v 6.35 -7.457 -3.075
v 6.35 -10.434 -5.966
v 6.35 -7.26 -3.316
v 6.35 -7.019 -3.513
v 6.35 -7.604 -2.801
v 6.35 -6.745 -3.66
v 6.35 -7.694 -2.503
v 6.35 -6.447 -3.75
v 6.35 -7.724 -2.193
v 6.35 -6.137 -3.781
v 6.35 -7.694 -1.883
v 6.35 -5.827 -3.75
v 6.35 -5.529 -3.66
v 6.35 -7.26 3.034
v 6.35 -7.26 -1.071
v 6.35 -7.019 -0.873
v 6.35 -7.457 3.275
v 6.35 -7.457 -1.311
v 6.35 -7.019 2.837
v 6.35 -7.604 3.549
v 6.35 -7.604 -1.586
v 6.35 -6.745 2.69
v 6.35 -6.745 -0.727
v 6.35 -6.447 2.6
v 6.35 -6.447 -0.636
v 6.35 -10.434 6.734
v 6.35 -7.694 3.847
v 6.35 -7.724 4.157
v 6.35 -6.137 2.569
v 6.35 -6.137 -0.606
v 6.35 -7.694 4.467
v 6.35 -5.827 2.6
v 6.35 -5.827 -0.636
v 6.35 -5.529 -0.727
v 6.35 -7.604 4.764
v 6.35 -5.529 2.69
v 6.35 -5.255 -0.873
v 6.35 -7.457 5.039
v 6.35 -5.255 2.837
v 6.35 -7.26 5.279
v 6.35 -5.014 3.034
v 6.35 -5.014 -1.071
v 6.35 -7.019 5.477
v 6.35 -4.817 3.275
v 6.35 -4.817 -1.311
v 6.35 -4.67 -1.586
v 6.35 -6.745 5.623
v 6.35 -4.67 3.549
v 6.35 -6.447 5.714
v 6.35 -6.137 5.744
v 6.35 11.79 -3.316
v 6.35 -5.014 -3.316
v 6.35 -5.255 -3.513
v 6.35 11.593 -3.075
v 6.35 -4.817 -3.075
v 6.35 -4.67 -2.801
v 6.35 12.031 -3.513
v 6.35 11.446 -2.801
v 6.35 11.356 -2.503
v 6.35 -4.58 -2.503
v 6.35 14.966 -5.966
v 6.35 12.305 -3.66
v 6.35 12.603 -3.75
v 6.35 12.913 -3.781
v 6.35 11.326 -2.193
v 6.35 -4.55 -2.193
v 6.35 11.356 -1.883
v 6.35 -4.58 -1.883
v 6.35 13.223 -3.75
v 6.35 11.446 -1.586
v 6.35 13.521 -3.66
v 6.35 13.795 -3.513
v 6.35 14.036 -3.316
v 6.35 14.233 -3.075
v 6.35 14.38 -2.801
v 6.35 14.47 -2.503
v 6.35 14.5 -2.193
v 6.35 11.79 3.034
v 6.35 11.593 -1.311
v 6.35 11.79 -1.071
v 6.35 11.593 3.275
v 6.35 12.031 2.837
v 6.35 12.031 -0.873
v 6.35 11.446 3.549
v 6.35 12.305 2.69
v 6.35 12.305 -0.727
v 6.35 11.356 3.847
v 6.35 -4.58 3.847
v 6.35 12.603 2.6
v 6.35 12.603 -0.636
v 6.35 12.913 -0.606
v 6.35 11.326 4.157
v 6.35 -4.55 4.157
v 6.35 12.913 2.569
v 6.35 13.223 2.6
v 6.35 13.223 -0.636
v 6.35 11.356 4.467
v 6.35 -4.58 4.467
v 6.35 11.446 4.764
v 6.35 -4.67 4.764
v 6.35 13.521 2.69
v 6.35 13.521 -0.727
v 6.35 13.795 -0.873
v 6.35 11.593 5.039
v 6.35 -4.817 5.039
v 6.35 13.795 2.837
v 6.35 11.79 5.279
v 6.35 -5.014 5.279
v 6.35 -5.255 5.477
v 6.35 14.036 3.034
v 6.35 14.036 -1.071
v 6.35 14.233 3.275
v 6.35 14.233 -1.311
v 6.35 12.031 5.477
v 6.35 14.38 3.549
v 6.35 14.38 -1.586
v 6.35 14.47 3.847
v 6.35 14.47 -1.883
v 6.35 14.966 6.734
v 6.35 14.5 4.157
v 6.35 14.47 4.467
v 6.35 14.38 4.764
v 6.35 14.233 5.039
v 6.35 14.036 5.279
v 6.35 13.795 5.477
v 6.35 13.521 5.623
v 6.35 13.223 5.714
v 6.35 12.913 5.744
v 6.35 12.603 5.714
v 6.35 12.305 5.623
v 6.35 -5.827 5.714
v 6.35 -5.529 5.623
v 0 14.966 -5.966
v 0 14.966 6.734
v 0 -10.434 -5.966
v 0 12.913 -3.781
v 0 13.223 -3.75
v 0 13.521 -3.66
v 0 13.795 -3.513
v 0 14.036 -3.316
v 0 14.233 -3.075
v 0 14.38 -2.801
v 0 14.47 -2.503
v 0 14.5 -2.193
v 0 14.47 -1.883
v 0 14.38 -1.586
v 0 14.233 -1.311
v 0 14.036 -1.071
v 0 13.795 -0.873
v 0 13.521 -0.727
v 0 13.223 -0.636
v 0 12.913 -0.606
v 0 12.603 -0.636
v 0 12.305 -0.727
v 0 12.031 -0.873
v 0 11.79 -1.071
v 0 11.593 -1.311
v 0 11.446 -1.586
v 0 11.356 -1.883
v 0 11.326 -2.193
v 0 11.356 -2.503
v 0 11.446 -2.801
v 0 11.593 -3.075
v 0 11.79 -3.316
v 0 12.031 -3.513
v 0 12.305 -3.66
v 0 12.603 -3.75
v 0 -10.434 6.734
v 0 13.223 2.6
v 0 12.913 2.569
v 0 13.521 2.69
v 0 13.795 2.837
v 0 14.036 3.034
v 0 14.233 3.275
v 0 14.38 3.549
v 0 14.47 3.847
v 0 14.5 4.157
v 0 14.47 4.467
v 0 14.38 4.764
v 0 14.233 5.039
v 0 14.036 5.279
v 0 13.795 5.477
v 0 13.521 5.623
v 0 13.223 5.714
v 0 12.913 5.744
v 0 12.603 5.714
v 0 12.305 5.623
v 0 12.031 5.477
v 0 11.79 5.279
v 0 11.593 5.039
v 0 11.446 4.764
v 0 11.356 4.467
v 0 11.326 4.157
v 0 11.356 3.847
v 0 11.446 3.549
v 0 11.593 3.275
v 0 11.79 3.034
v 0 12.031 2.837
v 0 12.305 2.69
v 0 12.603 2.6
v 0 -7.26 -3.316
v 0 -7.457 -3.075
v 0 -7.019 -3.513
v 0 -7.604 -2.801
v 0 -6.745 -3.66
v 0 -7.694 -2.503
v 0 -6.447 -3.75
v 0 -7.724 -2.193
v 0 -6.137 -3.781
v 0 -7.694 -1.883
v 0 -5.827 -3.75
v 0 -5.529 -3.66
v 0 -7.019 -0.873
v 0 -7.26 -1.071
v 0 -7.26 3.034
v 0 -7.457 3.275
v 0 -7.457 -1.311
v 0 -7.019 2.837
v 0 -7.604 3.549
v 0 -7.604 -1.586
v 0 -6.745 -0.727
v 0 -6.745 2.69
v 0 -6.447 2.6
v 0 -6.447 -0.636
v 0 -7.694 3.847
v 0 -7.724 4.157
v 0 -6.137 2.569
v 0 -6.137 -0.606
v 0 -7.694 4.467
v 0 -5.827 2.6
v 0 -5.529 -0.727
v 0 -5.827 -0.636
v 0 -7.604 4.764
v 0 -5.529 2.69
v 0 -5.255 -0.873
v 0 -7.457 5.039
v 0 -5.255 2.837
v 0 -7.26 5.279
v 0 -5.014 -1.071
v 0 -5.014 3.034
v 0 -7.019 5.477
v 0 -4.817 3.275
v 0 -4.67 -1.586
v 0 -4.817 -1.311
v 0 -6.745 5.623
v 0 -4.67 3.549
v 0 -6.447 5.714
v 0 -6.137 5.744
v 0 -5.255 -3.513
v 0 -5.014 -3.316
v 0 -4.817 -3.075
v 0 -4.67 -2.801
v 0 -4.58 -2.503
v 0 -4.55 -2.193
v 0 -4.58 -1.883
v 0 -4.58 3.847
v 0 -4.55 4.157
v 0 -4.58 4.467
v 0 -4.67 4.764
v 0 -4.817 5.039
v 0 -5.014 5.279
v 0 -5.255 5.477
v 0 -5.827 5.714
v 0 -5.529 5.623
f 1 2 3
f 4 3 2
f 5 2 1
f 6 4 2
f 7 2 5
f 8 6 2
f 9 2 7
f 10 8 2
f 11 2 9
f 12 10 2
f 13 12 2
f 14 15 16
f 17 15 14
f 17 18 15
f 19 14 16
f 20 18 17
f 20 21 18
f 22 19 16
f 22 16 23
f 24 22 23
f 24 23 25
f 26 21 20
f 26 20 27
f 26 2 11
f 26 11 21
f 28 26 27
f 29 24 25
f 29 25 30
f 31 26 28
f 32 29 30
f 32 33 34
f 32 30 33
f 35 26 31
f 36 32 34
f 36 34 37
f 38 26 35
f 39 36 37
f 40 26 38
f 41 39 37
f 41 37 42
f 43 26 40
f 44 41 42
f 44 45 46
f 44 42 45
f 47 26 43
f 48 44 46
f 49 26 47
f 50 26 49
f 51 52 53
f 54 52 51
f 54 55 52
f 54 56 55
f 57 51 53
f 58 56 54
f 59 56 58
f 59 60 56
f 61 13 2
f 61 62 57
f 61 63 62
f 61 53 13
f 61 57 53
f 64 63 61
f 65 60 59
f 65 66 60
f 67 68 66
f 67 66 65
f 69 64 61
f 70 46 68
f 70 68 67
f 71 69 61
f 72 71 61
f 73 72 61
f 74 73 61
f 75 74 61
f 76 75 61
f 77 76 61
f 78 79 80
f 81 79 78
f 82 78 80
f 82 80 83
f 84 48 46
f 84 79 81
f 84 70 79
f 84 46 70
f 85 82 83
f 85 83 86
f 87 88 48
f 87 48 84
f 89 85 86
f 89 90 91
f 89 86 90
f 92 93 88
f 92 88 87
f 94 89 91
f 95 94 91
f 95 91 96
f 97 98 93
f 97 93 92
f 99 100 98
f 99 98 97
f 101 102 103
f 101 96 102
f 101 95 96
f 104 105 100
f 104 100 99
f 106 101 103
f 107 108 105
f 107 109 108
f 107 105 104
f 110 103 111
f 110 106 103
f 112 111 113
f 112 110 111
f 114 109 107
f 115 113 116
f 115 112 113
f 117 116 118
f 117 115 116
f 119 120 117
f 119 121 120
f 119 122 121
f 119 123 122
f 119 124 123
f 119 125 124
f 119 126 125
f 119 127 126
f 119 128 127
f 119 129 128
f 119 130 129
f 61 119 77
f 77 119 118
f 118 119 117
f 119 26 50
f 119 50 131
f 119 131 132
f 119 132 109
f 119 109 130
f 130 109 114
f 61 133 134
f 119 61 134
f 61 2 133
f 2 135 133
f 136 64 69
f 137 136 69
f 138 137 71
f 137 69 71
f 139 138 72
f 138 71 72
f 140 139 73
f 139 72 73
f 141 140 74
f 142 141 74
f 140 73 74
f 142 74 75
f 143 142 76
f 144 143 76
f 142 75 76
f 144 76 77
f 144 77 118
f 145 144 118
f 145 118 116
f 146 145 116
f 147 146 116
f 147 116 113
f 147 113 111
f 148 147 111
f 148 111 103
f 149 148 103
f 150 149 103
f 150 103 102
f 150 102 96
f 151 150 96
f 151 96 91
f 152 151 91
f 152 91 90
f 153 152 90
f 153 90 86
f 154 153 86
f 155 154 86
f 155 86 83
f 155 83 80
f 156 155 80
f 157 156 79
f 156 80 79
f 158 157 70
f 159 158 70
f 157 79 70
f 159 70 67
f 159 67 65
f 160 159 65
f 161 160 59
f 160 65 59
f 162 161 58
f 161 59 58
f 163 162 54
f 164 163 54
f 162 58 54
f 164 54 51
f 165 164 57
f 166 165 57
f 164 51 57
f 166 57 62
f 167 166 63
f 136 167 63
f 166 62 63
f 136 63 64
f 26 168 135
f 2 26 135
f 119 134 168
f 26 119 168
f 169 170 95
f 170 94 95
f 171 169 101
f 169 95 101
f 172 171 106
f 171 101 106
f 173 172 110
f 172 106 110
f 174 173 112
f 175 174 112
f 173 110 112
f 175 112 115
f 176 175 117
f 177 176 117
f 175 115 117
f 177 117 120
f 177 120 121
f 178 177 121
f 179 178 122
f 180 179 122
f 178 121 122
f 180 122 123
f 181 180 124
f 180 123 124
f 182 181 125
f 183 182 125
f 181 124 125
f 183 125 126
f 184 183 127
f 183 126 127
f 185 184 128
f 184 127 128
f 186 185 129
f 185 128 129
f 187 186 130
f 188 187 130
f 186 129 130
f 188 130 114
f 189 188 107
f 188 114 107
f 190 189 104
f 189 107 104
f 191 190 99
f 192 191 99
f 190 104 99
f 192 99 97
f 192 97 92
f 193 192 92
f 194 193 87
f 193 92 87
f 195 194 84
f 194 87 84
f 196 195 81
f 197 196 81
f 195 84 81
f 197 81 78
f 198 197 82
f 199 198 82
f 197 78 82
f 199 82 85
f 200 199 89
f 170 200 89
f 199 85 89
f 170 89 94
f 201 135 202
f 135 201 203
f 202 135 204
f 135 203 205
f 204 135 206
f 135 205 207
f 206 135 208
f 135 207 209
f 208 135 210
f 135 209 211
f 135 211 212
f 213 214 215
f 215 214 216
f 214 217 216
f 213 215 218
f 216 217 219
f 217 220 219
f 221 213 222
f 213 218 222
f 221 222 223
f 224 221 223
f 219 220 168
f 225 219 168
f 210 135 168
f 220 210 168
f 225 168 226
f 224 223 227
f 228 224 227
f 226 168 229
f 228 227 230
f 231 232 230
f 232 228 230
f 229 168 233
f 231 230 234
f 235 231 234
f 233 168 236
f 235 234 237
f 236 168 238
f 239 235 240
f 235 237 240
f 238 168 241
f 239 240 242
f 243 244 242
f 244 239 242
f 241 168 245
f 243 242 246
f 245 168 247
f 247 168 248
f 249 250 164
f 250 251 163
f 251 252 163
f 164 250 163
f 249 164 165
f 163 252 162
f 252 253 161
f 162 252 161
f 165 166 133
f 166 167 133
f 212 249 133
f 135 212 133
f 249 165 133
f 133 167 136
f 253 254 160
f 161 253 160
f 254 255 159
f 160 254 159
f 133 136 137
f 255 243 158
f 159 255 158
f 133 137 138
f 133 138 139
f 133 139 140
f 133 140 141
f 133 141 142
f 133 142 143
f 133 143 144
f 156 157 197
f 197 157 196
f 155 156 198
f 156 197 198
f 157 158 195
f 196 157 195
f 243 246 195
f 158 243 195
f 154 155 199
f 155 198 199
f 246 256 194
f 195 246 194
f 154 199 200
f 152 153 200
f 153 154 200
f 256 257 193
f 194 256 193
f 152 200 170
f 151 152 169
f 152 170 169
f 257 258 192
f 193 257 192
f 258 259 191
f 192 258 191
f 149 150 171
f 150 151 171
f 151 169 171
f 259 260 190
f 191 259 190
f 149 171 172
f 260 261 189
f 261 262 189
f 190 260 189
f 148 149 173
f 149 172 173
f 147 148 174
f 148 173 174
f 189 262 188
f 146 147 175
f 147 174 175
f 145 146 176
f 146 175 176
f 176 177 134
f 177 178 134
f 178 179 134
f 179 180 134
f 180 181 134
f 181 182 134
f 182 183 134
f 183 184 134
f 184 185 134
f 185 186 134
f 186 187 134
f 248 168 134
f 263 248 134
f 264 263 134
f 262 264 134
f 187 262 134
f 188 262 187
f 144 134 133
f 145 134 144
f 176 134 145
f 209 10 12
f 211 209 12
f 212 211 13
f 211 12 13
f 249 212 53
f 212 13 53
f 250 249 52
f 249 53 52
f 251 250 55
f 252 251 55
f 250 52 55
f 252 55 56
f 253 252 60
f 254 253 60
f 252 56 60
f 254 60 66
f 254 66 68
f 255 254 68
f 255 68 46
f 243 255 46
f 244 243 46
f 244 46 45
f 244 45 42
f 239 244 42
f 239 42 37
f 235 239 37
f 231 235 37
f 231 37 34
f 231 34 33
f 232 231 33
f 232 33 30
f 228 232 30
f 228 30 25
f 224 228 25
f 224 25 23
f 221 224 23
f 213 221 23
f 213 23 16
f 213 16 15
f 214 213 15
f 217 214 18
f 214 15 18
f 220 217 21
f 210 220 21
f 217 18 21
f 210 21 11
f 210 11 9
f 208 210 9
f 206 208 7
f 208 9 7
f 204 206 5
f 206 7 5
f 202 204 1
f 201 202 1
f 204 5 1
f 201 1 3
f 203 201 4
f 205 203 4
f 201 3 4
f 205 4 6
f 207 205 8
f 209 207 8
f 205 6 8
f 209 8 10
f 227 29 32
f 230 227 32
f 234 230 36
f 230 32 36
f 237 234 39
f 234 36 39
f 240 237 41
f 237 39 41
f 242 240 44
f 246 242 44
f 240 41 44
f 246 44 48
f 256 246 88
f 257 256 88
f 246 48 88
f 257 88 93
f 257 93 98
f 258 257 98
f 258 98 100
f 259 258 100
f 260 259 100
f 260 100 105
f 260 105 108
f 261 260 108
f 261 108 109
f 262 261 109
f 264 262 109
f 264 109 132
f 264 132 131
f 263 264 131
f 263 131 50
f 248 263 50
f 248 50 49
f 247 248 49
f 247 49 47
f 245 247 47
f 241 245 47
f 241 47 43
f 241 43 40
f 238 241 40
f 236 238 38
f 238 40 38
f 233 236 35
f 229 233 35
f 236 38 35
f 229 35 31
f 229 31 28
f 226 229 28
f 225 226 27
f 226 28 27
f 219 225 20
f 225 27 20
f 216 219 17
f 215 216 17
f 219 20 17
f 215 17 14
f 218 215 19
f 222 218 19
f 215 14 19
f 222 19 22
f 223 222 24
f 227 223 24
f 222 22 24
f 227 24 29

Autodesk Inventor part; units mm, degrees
ref_plane "YZ Plane" through (0, 0, 0) normal (1, 0, 0) x (0, 1, 0)
ref_plane "XZ Plane" through (0, 0, 0) normal (0, 1, 0) x (-1, 0, 0)
ref_plane "XY Plane" through (0, 0, 0) normal (0, 0, 1) x (1, 0, 0)
sketch "Sketch1" plane through (0, 0, 0) normal (1, 0, 0) x (0, 1, 0)
  line L0 (14.9656, 6.7345) -> (-10.4344, 6.7345)
  line L1 (-10.4344, 6.7345) -> (-10.4344, -5.9655)
  line L2 (-10.4344, -5.9655) -> (14.9656, -5.9655)
  line L3 (14.9656, -5.9655) -> (14.9656, 6.7345)
  point P0 (0, 0)
  dimension "d0" = 25.4
  dimension "d1" = 12.7
extrude "Extrusion1" add sketch "Sketch1" along normal blind 6.35
sketch "Sketch2" plane through (6.35, 0, 0) normal (1, 0, 0) x (0, 0, -1)
  circle A0 centre (-4.1568, 12.913) radius 1.5875
  line L0 (-6.7345, 14.9656) -> (-6.7345, -10.4344) projected
  line L1 (5.9655, 14.9656) -> (-6.7345, 14.9656) projected
  circle A1 centre (2.1932, 12.913) radius 1.5875
  circle A2 centre (-4.1568, -6.137) radius 1.5875
  circle A3 centre (2.1932, -6.137) radius 1.5875
  point P0 (0, 0)
  dimension "d4" = 3.175
  dimension "d9" = 6.35
  dimension "d12" = 19.05
extrude "Extrusion2" cut sketch "Sketch2" against normal blind 6.35
equation "\"d1\" = 0.5 * d0"
equation "\"d2\" = 0.5 * d1"
equation "\"d4\" = 0.5 * d2"
equation "\"d15\" = 0.5 * d1"
properties part number "8.2a"
